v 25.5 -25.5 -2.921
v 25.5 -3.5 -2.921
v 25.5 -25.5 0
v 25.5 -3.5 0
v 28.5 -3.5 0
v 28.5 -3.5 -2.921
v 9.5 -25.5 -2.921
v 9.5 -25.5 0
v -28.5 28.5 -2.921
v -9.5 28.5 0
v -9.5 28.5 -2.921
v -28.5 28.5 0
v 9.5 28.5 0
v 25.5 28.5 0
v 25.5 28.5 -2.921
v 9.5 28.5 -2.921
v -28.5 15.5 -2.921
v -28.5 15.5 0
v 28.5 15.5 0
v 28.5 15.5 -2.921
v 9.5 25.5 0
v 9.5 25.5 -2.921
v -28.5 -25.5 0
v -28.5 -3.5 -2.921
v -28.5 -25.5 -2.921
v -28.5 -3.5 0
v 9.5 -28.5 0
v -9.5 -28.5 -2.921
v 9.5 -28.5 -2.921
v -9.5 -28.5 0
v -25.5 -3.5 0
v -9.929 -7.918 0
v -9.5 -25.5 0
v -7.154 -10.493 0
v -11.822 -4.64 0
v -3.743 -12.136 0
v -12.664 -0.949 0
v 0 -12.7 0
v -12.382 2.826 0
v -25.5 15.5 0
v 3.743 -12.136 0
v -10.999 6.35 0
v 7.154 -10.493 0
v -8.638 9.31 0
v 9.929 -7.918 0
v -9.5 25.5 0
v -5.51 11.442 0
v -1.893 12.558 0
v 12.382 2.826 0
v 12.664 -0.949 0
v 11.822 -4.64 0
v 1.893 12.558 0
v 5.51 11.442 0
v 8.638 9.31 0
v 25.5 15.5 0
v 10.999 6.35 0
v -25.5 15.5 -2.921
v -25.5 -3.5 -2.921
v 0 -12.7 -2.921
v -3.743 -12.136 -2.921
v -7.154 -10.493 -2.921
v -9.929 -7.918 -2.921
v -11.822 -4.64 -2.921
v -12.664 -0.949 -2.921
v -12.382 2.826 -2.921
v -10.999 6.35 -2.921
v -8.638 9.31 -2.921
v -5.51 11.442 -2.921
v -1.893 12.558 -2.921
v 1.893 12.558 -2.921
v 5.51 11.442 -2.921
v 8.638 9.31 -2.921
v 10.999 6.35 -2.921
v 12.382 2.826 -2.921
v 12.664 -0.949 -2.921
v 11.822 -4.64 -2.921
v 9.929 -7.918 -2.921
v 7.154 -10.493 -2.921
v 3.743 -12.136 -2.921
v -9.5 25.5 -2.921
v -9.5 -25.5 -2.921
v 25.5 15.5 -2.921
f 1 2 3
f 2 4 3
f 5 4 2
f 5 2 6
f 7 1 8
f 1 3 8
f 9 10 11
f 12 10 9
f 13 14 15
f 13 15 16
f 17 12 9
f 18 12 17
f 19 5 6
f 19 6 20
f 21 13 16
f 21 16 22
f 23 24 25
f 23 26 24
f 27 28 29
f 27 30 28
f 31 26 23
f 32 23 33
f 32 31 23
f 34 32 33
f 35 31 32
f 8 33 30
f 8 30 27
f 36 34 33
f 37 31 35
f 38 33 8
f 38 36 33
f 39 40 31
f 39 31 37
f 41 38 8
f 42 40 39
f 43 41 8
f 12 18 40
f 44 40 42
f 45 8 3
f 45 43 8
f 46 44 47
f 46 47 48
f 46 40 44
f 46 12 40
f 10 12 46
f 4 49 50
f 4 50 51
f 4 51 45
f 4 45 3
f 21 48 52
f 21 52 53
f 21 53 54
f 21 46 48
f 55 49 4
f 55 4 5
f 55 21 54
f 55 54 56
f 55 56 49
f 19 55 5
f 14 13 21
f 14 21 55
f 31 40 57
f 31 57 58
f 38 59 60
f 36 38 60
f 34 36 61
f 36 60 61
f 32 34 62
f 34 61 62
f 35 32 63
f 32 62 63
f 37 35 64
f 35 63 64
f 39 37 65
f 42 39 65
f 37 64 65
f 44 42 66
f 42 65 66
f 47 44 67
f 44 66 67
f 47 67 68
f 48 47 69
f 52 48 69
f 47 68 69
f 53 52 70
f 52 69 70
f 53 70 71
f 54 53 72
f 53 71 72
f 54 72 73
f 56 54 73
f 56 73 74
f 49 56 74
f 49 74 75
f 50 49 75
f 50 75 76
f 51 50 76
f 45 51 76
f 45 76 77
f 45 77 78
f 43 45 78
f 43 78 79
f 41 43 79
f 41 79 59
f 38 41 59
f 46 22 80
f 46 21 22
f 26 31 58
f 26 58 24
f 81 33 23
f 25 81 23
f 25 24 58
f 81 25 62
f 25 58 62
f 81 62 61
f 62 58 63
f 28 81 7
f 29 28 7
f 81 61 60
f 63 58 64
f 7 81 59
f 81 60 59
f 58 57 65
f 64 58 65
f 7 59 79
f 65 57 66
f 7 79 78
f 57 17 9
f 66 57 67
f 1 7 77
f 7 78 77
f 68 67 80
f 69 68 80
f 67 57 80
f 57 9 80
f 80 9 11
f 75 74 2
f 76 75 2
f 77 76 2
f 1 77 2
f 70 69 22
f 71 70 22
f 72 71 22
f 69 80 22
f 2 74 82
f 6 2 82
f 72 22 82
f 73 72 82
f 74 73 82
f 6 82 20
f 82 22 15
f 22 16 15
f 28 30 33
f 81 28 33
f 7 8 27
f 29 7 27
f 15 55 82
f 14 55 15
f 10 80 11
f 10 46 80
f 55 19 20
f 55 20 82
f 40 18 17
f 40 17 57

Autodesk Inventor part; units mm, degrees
ref_plane "YZ Plane" through (0, 0, 0) normal (1, 0, 0) x (0, 1, 0)
ref_plane "XZ Plane" through (0, 0, 0) normal (0, 1, 0) x (-1, 0, 0)
ref_plane "XY Plane" through (0, 0, 0) normal (0, 0, 1) x (1, 0, 0)
sketch "Sketch1" plane through (0, 0, 0) normal (0, 0, 1) x (1, 0, 0)
  line L0 (-28.5, -28.5) -> (28.5, -28.5)
  line L1 (28.5, -28.5) -> (28.5, 28.5)
  line L2 (28.5, 28.5) -> (-28.5, 28.5)
  line L3 (-28.5, 28.5) -> (-28.5, -28.5)
  line L4 (-28.5, -28.5) -> (28.5, 28.5) construction
  line L5 (28.5, -28.5) -> (-28.5, 28.5) construction
  point P0 (0, 0)
  dimension "d0" = 57
  dimension "d1" = 57
extrude "Extrusion1" add sketch "Sketch1" against normal blind 2.921
sketch "Sketch4" plane through (0, 0, 0) normal (0, 0, 1) x (1, 0, 0)
  line L0 (28.5, -25.5) -> (9.5, -25.5)
  line L1 (9.5, -25.5) -> (9.5, -28.5)
  line L2 (9.5, -28.5) -> (28.5, -28.5)
  line L3 (28.5, -28.5) -> (28.5, -25.5)
  line L4 (-28.5, -28.5) -> (-9.5, -28.5)
  line L5 (-9.5, -28.5) -> (-9.5, -25.5)
  line L6 (-9.5, -25.5) -> (-28.5, -25.5)
  line L7 (-28.5, -25.5) -> (-28.5, -28.5)
  line L8 (28.5, -28.5) -> (28.5, 28.5) projected
  line L9 (28.5, 28.5) -> (-28.5, 28.5) projected
  line L10 (-28.5, 28.5) -> (-28.5, -28.5) projected
  line L11 (-28.5, 15.5) -> (-25.5, 15.5)
  line L12 (-25.5, 15.5) -> (-25.5, -3.5)
  line L13 (-25.5, -3.5) -> (-28.5, -3.5)
  line L14 (-28.5, -3.5) -> (-28.5, 15.5)
  line L15 (28.5, 15.5) -> (25.5, 15.5)
  line L16 (25.5, 15.5) -> (25.5, -3.5)
  line L17 (25.5, -3.5) -> (28.5, -3.5)
  line L18 (28.5, -3.5) -> (28.5, 15.5)
  line L19 (-9.5, 28.5) -> (9.5, 28.5)
  line L20 (9.5, 28.5) -> (9.5, 25.5)
  line L21 (9.5, 25.5) -> (-9.5, 25.5)
  line L22 (-9.5, 25.5) -> (-9.5, 28.5)
  line L23 (-28.5, -28.5) -> (28.5, -28.5) projected
  line L24 (25.5, -3.5) -> (25.5, -28.5)
  line L25 (25.5, 15.5) -> (25.5, 28.5)
  point P0 (0, 0)
  dimension "d12" = 19
  dimension "d13" = 3
  dimension "d16" = 3
  dimension "d37" = 9.5
  dimension "d38" = 19
  dimension "d39" = 9.5
  dimension "d40" = 3
  dimension "d41" = 3
  dimension "d42" = 19
  dimension "d43" = 19
  dimension "d44" = 3
  dimension "d45" = 19
  dimension "d46" = 19
  dimension "d50" = 25
  dimension "d51" = 25
  dimension "d52" = 19
  dimension "d53" = 57
  dimension "d54" = 57
extrude "Extrusion5" cut sketch "Sketch4" against normal blind 25.4 contours L3 L2 L24 L0 | L0 L24 L17 L8 | L24 L2 L1 L0 | L15 L25 L9 L8 | L4 L7 L6 L5 | L20 L21 L22 L9 | L10 L11 L12 L13
hole "Hole1" at (0, 0, 0) direction (0, 0, -1) diameter 25.4 end through all
equation "\"d1\" = d0"
equation "\"d12\" = d38"
equation "\"d13\" = d16"
equation "\"d16\" = d44"
equation "\"d38\" = d45"
equation "\"d39\" = d37"
equation "\"d40\" = d44"
equation "\"d41\" = d16"
equation "\"d42\" = d45"
equation "\"d43\" = d42"
equation "\"d46\" = d45"
equation "\"d51\" = d50"
equation "\"d19\" = 0.5 * d0"
equation "\"d48\" = 0.5 * d0"
properties part number "Side B"
